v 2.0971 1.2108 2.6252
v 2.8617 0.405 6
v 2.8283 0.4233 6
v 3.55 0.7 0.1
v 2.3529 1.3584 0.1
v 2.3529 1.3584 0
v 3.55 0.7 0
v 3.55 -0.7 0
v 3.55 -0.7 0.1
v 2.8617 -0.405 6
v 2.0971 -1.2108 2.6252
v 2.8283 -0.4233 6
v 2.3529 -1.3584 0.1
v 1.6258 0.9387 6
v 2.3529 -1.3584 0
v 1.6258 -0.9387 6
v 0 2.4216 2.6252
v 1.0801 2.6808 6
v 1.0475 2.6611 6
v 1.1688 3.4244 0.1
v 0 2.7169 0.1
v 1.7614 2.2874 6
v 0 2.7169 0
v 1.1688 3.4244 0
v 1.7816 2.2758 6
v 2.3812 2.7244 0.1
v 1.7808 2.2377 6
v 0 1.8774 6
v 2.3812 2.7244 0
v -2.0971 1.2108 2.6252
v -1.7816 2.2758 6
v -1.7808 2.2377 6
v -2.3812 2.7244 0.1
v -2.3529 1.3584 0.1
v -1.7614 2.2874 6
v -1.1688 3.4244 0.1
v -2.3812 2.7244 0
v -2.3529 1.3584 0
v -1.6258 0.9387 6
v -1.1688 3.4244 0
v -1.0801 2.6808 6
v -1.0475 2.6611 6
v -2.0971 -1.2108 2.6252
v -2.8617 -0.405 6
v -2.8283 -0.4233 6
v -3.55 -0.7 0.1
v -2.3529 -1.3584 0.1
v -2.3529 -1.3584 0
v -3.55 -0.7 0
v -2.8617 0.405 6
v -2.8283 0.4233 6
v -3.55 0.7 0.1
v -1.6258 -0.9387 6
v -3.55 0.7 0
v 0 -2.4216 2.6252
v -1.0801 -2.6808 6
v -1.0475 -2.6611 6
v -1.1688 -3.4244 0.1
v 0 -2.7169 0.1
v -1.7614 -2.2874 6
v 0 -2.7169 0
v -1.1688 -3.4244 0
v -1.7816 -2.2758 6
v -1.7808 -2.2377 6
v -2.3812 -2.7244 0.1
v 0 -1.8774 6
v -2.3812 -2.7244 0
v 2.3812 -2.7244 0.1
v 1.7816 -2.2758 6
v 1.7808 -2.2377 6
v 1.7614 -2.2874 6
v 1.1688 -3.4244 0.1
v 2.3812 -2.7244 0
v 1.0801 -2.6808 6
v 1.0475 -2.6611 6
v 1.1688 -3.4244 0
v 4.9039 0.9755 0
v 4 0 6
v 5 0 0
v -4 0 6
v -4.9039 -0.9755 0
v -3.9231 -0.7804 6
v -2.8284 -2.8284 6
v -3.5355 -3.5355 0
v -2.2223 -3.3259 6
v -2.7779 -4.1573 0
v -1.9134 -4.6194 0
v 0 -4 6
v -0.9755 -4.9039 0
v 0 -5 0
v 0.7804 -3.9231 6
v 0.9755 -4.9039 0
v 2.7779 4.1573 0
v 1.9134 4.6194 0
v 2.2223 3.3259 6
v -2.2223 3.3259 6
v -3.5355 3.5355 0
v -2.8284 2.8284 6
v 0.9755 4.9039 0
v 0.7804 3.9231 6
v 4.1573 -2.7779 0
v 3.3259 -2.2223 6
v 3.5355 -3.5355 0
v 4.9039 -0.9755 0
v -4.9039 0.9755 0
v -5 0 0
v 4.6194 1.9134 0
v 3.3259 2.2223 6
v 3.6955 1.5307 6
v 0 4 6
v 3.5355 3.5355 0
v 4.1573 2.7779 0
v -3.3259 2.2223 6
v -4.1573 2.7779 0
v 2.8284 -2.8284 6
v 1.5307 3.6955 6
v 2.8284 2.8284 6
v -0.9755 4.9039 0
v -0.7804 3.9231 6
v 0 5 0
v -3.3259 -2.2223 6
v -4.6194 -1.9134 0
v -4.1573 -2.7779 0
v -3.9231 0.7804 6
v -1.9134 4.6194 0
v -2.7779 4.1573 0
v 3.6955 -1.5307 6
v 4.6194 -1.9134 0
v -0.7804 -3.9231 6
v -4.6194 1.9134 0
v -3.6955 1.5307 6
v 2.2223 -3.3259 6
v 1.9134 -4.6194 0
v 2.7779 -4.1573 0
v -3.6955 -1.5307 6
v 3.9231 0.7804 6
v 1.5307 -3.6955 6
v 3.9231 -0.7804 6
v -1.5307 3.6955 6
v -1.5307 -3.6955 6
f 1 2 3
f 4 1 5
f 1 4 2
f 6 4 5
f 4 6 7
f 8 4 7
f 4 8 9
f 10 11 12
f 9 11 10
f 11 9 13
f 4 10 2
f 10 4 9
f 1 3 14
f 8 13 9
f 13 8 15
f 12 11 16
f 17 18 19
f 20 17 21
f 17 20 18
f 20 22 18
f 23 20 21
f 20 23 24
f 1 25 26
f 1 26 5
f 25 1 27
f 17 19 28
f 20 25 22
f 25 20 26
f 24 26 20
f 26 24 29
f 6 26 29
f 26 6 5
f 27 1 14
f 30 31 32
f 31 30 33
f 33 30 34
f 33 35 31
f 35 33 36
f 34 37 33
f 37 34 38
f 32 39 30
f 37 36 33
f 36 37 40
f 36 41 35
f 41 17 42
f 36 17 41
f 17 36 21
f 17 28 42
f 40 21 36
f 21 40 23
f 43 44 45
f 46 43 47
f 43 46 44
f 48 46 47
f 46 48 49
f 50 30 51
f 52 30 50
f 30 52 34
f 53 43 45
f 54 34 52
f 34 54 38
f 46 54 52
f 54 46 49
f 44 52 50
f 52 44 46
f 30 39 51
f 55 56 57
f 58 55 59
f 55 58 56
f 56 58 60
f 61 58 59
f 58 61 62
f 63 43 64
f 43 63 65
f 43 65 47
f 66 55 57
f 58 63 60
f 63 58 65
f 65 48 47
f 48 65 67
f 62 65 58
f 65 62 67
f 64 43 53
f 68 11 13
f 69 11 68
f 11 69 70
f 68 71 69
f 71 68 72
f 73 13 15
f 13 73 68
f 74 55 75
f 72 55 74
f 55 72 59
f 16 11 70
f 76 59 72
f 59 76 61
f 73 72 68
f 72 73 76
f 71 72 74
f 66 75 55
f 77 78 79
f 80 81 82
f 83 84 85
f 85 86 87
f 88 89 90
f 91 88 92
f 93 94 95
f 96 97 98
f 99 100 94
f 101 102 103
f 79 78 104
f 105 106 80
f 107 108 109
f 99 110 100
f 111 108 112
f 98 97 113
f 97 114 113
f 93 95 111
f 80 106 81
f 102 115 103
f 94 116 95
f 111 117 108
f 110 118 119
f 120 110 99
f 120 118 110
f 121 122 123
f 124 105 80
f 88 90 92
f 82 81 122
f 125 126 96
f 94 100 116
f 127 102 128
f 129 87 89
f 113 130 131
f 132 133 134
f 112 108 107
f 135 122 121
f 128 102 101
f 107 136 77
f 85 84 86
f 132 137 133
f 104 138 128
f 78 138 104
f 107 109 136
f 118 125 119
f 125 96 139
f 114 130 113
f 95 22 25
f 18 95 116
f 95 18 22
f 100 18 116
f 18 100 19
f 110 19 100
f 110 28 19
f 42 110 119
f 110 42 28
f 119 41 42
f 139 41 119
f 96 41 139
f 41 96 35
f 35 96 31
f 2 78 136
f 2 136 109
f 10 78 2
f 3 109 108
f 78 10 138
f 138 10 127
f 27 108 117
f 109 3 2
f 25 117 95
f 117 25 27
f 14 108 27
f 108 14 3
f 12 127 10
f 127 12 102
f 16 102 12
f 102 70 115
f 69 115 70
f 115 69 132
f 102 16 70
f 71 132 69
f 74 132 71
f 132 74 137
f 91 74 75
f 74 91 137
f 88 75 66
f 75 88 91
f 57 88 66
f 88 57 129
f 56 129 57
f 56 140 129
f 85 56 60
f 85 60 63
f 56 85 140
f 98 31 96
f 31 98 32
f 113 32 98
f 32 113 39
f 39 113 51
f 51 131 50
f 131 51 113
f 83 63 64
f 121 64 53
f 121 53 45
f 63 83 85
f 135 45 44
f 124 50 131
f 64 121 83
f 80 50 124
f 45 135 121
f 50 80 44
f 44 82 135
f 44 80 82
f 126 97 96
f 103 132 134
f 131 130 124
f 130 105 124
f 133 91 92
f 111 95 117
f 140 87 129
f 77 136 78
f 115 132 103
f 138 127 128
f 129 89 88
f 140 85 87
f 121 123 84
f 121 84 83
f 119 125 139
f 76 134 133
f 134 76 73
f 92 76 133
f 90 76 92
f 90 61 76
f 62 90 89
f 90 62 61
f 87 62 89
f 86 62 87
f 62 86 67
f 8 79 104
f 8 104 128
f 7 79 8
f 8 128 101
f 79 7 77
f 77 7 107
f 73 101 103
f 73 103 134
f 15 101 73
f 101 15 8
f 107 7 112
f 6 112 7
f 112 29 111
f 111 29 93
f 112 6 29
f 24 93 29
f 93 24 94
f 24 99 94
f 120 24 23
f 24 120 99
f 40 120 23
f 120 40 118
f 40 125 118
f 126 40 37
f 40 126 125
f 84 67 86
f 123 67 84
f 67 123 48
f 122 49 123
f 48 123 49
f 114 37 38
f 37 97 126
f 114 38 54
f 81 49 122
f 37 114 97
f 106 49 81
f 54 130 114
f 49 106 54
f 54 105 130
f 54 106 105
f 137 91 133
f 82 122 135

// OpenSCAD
%cylinder(r=4.9/2,h=6.05,$fn=32);

skewerCap();


// this one is pretty good for kebab skewer, which seems to be slightly
// less than 3/16" diameter.  May need a little wider at top for 3/16" machine rod
module skewerCap() difference() {
  cylinder(r1=5,r2=4,h=6,$fn=32);

  for(a=[0:60:359]) rotate([0,0,a]) hull() { //cube([6,2.2,18],center=true);
    //translate([2.2,0,-.2]) cylinder(r1=1.2,r2=0.8,h=7,$fn=6);
    //translate([0  ,0,-.2])#cylinder(r1=2.4,r2=0.8,h=7,$fn=4);

    // lower
    #translate([3.5,0,0]) cube([.1,1.4,.2],center=true);
    #translate([1.5,0,0]) cube([.1,3.6,.2],center=true);

    // upper
    #translate([2.8,0,6]) cube([.1,0.8,.2],center=true);
    //%translate([1  ,0,6]) cube([.1,2  ,.2],center=true);
    #translate([1.4,0,6]) cube([.1,2  ,.2],center=true);
  }
  translate([0,0,-.4]) cylinder(r1=5/2,r2=1.8,h=7,$fn=12);
}
